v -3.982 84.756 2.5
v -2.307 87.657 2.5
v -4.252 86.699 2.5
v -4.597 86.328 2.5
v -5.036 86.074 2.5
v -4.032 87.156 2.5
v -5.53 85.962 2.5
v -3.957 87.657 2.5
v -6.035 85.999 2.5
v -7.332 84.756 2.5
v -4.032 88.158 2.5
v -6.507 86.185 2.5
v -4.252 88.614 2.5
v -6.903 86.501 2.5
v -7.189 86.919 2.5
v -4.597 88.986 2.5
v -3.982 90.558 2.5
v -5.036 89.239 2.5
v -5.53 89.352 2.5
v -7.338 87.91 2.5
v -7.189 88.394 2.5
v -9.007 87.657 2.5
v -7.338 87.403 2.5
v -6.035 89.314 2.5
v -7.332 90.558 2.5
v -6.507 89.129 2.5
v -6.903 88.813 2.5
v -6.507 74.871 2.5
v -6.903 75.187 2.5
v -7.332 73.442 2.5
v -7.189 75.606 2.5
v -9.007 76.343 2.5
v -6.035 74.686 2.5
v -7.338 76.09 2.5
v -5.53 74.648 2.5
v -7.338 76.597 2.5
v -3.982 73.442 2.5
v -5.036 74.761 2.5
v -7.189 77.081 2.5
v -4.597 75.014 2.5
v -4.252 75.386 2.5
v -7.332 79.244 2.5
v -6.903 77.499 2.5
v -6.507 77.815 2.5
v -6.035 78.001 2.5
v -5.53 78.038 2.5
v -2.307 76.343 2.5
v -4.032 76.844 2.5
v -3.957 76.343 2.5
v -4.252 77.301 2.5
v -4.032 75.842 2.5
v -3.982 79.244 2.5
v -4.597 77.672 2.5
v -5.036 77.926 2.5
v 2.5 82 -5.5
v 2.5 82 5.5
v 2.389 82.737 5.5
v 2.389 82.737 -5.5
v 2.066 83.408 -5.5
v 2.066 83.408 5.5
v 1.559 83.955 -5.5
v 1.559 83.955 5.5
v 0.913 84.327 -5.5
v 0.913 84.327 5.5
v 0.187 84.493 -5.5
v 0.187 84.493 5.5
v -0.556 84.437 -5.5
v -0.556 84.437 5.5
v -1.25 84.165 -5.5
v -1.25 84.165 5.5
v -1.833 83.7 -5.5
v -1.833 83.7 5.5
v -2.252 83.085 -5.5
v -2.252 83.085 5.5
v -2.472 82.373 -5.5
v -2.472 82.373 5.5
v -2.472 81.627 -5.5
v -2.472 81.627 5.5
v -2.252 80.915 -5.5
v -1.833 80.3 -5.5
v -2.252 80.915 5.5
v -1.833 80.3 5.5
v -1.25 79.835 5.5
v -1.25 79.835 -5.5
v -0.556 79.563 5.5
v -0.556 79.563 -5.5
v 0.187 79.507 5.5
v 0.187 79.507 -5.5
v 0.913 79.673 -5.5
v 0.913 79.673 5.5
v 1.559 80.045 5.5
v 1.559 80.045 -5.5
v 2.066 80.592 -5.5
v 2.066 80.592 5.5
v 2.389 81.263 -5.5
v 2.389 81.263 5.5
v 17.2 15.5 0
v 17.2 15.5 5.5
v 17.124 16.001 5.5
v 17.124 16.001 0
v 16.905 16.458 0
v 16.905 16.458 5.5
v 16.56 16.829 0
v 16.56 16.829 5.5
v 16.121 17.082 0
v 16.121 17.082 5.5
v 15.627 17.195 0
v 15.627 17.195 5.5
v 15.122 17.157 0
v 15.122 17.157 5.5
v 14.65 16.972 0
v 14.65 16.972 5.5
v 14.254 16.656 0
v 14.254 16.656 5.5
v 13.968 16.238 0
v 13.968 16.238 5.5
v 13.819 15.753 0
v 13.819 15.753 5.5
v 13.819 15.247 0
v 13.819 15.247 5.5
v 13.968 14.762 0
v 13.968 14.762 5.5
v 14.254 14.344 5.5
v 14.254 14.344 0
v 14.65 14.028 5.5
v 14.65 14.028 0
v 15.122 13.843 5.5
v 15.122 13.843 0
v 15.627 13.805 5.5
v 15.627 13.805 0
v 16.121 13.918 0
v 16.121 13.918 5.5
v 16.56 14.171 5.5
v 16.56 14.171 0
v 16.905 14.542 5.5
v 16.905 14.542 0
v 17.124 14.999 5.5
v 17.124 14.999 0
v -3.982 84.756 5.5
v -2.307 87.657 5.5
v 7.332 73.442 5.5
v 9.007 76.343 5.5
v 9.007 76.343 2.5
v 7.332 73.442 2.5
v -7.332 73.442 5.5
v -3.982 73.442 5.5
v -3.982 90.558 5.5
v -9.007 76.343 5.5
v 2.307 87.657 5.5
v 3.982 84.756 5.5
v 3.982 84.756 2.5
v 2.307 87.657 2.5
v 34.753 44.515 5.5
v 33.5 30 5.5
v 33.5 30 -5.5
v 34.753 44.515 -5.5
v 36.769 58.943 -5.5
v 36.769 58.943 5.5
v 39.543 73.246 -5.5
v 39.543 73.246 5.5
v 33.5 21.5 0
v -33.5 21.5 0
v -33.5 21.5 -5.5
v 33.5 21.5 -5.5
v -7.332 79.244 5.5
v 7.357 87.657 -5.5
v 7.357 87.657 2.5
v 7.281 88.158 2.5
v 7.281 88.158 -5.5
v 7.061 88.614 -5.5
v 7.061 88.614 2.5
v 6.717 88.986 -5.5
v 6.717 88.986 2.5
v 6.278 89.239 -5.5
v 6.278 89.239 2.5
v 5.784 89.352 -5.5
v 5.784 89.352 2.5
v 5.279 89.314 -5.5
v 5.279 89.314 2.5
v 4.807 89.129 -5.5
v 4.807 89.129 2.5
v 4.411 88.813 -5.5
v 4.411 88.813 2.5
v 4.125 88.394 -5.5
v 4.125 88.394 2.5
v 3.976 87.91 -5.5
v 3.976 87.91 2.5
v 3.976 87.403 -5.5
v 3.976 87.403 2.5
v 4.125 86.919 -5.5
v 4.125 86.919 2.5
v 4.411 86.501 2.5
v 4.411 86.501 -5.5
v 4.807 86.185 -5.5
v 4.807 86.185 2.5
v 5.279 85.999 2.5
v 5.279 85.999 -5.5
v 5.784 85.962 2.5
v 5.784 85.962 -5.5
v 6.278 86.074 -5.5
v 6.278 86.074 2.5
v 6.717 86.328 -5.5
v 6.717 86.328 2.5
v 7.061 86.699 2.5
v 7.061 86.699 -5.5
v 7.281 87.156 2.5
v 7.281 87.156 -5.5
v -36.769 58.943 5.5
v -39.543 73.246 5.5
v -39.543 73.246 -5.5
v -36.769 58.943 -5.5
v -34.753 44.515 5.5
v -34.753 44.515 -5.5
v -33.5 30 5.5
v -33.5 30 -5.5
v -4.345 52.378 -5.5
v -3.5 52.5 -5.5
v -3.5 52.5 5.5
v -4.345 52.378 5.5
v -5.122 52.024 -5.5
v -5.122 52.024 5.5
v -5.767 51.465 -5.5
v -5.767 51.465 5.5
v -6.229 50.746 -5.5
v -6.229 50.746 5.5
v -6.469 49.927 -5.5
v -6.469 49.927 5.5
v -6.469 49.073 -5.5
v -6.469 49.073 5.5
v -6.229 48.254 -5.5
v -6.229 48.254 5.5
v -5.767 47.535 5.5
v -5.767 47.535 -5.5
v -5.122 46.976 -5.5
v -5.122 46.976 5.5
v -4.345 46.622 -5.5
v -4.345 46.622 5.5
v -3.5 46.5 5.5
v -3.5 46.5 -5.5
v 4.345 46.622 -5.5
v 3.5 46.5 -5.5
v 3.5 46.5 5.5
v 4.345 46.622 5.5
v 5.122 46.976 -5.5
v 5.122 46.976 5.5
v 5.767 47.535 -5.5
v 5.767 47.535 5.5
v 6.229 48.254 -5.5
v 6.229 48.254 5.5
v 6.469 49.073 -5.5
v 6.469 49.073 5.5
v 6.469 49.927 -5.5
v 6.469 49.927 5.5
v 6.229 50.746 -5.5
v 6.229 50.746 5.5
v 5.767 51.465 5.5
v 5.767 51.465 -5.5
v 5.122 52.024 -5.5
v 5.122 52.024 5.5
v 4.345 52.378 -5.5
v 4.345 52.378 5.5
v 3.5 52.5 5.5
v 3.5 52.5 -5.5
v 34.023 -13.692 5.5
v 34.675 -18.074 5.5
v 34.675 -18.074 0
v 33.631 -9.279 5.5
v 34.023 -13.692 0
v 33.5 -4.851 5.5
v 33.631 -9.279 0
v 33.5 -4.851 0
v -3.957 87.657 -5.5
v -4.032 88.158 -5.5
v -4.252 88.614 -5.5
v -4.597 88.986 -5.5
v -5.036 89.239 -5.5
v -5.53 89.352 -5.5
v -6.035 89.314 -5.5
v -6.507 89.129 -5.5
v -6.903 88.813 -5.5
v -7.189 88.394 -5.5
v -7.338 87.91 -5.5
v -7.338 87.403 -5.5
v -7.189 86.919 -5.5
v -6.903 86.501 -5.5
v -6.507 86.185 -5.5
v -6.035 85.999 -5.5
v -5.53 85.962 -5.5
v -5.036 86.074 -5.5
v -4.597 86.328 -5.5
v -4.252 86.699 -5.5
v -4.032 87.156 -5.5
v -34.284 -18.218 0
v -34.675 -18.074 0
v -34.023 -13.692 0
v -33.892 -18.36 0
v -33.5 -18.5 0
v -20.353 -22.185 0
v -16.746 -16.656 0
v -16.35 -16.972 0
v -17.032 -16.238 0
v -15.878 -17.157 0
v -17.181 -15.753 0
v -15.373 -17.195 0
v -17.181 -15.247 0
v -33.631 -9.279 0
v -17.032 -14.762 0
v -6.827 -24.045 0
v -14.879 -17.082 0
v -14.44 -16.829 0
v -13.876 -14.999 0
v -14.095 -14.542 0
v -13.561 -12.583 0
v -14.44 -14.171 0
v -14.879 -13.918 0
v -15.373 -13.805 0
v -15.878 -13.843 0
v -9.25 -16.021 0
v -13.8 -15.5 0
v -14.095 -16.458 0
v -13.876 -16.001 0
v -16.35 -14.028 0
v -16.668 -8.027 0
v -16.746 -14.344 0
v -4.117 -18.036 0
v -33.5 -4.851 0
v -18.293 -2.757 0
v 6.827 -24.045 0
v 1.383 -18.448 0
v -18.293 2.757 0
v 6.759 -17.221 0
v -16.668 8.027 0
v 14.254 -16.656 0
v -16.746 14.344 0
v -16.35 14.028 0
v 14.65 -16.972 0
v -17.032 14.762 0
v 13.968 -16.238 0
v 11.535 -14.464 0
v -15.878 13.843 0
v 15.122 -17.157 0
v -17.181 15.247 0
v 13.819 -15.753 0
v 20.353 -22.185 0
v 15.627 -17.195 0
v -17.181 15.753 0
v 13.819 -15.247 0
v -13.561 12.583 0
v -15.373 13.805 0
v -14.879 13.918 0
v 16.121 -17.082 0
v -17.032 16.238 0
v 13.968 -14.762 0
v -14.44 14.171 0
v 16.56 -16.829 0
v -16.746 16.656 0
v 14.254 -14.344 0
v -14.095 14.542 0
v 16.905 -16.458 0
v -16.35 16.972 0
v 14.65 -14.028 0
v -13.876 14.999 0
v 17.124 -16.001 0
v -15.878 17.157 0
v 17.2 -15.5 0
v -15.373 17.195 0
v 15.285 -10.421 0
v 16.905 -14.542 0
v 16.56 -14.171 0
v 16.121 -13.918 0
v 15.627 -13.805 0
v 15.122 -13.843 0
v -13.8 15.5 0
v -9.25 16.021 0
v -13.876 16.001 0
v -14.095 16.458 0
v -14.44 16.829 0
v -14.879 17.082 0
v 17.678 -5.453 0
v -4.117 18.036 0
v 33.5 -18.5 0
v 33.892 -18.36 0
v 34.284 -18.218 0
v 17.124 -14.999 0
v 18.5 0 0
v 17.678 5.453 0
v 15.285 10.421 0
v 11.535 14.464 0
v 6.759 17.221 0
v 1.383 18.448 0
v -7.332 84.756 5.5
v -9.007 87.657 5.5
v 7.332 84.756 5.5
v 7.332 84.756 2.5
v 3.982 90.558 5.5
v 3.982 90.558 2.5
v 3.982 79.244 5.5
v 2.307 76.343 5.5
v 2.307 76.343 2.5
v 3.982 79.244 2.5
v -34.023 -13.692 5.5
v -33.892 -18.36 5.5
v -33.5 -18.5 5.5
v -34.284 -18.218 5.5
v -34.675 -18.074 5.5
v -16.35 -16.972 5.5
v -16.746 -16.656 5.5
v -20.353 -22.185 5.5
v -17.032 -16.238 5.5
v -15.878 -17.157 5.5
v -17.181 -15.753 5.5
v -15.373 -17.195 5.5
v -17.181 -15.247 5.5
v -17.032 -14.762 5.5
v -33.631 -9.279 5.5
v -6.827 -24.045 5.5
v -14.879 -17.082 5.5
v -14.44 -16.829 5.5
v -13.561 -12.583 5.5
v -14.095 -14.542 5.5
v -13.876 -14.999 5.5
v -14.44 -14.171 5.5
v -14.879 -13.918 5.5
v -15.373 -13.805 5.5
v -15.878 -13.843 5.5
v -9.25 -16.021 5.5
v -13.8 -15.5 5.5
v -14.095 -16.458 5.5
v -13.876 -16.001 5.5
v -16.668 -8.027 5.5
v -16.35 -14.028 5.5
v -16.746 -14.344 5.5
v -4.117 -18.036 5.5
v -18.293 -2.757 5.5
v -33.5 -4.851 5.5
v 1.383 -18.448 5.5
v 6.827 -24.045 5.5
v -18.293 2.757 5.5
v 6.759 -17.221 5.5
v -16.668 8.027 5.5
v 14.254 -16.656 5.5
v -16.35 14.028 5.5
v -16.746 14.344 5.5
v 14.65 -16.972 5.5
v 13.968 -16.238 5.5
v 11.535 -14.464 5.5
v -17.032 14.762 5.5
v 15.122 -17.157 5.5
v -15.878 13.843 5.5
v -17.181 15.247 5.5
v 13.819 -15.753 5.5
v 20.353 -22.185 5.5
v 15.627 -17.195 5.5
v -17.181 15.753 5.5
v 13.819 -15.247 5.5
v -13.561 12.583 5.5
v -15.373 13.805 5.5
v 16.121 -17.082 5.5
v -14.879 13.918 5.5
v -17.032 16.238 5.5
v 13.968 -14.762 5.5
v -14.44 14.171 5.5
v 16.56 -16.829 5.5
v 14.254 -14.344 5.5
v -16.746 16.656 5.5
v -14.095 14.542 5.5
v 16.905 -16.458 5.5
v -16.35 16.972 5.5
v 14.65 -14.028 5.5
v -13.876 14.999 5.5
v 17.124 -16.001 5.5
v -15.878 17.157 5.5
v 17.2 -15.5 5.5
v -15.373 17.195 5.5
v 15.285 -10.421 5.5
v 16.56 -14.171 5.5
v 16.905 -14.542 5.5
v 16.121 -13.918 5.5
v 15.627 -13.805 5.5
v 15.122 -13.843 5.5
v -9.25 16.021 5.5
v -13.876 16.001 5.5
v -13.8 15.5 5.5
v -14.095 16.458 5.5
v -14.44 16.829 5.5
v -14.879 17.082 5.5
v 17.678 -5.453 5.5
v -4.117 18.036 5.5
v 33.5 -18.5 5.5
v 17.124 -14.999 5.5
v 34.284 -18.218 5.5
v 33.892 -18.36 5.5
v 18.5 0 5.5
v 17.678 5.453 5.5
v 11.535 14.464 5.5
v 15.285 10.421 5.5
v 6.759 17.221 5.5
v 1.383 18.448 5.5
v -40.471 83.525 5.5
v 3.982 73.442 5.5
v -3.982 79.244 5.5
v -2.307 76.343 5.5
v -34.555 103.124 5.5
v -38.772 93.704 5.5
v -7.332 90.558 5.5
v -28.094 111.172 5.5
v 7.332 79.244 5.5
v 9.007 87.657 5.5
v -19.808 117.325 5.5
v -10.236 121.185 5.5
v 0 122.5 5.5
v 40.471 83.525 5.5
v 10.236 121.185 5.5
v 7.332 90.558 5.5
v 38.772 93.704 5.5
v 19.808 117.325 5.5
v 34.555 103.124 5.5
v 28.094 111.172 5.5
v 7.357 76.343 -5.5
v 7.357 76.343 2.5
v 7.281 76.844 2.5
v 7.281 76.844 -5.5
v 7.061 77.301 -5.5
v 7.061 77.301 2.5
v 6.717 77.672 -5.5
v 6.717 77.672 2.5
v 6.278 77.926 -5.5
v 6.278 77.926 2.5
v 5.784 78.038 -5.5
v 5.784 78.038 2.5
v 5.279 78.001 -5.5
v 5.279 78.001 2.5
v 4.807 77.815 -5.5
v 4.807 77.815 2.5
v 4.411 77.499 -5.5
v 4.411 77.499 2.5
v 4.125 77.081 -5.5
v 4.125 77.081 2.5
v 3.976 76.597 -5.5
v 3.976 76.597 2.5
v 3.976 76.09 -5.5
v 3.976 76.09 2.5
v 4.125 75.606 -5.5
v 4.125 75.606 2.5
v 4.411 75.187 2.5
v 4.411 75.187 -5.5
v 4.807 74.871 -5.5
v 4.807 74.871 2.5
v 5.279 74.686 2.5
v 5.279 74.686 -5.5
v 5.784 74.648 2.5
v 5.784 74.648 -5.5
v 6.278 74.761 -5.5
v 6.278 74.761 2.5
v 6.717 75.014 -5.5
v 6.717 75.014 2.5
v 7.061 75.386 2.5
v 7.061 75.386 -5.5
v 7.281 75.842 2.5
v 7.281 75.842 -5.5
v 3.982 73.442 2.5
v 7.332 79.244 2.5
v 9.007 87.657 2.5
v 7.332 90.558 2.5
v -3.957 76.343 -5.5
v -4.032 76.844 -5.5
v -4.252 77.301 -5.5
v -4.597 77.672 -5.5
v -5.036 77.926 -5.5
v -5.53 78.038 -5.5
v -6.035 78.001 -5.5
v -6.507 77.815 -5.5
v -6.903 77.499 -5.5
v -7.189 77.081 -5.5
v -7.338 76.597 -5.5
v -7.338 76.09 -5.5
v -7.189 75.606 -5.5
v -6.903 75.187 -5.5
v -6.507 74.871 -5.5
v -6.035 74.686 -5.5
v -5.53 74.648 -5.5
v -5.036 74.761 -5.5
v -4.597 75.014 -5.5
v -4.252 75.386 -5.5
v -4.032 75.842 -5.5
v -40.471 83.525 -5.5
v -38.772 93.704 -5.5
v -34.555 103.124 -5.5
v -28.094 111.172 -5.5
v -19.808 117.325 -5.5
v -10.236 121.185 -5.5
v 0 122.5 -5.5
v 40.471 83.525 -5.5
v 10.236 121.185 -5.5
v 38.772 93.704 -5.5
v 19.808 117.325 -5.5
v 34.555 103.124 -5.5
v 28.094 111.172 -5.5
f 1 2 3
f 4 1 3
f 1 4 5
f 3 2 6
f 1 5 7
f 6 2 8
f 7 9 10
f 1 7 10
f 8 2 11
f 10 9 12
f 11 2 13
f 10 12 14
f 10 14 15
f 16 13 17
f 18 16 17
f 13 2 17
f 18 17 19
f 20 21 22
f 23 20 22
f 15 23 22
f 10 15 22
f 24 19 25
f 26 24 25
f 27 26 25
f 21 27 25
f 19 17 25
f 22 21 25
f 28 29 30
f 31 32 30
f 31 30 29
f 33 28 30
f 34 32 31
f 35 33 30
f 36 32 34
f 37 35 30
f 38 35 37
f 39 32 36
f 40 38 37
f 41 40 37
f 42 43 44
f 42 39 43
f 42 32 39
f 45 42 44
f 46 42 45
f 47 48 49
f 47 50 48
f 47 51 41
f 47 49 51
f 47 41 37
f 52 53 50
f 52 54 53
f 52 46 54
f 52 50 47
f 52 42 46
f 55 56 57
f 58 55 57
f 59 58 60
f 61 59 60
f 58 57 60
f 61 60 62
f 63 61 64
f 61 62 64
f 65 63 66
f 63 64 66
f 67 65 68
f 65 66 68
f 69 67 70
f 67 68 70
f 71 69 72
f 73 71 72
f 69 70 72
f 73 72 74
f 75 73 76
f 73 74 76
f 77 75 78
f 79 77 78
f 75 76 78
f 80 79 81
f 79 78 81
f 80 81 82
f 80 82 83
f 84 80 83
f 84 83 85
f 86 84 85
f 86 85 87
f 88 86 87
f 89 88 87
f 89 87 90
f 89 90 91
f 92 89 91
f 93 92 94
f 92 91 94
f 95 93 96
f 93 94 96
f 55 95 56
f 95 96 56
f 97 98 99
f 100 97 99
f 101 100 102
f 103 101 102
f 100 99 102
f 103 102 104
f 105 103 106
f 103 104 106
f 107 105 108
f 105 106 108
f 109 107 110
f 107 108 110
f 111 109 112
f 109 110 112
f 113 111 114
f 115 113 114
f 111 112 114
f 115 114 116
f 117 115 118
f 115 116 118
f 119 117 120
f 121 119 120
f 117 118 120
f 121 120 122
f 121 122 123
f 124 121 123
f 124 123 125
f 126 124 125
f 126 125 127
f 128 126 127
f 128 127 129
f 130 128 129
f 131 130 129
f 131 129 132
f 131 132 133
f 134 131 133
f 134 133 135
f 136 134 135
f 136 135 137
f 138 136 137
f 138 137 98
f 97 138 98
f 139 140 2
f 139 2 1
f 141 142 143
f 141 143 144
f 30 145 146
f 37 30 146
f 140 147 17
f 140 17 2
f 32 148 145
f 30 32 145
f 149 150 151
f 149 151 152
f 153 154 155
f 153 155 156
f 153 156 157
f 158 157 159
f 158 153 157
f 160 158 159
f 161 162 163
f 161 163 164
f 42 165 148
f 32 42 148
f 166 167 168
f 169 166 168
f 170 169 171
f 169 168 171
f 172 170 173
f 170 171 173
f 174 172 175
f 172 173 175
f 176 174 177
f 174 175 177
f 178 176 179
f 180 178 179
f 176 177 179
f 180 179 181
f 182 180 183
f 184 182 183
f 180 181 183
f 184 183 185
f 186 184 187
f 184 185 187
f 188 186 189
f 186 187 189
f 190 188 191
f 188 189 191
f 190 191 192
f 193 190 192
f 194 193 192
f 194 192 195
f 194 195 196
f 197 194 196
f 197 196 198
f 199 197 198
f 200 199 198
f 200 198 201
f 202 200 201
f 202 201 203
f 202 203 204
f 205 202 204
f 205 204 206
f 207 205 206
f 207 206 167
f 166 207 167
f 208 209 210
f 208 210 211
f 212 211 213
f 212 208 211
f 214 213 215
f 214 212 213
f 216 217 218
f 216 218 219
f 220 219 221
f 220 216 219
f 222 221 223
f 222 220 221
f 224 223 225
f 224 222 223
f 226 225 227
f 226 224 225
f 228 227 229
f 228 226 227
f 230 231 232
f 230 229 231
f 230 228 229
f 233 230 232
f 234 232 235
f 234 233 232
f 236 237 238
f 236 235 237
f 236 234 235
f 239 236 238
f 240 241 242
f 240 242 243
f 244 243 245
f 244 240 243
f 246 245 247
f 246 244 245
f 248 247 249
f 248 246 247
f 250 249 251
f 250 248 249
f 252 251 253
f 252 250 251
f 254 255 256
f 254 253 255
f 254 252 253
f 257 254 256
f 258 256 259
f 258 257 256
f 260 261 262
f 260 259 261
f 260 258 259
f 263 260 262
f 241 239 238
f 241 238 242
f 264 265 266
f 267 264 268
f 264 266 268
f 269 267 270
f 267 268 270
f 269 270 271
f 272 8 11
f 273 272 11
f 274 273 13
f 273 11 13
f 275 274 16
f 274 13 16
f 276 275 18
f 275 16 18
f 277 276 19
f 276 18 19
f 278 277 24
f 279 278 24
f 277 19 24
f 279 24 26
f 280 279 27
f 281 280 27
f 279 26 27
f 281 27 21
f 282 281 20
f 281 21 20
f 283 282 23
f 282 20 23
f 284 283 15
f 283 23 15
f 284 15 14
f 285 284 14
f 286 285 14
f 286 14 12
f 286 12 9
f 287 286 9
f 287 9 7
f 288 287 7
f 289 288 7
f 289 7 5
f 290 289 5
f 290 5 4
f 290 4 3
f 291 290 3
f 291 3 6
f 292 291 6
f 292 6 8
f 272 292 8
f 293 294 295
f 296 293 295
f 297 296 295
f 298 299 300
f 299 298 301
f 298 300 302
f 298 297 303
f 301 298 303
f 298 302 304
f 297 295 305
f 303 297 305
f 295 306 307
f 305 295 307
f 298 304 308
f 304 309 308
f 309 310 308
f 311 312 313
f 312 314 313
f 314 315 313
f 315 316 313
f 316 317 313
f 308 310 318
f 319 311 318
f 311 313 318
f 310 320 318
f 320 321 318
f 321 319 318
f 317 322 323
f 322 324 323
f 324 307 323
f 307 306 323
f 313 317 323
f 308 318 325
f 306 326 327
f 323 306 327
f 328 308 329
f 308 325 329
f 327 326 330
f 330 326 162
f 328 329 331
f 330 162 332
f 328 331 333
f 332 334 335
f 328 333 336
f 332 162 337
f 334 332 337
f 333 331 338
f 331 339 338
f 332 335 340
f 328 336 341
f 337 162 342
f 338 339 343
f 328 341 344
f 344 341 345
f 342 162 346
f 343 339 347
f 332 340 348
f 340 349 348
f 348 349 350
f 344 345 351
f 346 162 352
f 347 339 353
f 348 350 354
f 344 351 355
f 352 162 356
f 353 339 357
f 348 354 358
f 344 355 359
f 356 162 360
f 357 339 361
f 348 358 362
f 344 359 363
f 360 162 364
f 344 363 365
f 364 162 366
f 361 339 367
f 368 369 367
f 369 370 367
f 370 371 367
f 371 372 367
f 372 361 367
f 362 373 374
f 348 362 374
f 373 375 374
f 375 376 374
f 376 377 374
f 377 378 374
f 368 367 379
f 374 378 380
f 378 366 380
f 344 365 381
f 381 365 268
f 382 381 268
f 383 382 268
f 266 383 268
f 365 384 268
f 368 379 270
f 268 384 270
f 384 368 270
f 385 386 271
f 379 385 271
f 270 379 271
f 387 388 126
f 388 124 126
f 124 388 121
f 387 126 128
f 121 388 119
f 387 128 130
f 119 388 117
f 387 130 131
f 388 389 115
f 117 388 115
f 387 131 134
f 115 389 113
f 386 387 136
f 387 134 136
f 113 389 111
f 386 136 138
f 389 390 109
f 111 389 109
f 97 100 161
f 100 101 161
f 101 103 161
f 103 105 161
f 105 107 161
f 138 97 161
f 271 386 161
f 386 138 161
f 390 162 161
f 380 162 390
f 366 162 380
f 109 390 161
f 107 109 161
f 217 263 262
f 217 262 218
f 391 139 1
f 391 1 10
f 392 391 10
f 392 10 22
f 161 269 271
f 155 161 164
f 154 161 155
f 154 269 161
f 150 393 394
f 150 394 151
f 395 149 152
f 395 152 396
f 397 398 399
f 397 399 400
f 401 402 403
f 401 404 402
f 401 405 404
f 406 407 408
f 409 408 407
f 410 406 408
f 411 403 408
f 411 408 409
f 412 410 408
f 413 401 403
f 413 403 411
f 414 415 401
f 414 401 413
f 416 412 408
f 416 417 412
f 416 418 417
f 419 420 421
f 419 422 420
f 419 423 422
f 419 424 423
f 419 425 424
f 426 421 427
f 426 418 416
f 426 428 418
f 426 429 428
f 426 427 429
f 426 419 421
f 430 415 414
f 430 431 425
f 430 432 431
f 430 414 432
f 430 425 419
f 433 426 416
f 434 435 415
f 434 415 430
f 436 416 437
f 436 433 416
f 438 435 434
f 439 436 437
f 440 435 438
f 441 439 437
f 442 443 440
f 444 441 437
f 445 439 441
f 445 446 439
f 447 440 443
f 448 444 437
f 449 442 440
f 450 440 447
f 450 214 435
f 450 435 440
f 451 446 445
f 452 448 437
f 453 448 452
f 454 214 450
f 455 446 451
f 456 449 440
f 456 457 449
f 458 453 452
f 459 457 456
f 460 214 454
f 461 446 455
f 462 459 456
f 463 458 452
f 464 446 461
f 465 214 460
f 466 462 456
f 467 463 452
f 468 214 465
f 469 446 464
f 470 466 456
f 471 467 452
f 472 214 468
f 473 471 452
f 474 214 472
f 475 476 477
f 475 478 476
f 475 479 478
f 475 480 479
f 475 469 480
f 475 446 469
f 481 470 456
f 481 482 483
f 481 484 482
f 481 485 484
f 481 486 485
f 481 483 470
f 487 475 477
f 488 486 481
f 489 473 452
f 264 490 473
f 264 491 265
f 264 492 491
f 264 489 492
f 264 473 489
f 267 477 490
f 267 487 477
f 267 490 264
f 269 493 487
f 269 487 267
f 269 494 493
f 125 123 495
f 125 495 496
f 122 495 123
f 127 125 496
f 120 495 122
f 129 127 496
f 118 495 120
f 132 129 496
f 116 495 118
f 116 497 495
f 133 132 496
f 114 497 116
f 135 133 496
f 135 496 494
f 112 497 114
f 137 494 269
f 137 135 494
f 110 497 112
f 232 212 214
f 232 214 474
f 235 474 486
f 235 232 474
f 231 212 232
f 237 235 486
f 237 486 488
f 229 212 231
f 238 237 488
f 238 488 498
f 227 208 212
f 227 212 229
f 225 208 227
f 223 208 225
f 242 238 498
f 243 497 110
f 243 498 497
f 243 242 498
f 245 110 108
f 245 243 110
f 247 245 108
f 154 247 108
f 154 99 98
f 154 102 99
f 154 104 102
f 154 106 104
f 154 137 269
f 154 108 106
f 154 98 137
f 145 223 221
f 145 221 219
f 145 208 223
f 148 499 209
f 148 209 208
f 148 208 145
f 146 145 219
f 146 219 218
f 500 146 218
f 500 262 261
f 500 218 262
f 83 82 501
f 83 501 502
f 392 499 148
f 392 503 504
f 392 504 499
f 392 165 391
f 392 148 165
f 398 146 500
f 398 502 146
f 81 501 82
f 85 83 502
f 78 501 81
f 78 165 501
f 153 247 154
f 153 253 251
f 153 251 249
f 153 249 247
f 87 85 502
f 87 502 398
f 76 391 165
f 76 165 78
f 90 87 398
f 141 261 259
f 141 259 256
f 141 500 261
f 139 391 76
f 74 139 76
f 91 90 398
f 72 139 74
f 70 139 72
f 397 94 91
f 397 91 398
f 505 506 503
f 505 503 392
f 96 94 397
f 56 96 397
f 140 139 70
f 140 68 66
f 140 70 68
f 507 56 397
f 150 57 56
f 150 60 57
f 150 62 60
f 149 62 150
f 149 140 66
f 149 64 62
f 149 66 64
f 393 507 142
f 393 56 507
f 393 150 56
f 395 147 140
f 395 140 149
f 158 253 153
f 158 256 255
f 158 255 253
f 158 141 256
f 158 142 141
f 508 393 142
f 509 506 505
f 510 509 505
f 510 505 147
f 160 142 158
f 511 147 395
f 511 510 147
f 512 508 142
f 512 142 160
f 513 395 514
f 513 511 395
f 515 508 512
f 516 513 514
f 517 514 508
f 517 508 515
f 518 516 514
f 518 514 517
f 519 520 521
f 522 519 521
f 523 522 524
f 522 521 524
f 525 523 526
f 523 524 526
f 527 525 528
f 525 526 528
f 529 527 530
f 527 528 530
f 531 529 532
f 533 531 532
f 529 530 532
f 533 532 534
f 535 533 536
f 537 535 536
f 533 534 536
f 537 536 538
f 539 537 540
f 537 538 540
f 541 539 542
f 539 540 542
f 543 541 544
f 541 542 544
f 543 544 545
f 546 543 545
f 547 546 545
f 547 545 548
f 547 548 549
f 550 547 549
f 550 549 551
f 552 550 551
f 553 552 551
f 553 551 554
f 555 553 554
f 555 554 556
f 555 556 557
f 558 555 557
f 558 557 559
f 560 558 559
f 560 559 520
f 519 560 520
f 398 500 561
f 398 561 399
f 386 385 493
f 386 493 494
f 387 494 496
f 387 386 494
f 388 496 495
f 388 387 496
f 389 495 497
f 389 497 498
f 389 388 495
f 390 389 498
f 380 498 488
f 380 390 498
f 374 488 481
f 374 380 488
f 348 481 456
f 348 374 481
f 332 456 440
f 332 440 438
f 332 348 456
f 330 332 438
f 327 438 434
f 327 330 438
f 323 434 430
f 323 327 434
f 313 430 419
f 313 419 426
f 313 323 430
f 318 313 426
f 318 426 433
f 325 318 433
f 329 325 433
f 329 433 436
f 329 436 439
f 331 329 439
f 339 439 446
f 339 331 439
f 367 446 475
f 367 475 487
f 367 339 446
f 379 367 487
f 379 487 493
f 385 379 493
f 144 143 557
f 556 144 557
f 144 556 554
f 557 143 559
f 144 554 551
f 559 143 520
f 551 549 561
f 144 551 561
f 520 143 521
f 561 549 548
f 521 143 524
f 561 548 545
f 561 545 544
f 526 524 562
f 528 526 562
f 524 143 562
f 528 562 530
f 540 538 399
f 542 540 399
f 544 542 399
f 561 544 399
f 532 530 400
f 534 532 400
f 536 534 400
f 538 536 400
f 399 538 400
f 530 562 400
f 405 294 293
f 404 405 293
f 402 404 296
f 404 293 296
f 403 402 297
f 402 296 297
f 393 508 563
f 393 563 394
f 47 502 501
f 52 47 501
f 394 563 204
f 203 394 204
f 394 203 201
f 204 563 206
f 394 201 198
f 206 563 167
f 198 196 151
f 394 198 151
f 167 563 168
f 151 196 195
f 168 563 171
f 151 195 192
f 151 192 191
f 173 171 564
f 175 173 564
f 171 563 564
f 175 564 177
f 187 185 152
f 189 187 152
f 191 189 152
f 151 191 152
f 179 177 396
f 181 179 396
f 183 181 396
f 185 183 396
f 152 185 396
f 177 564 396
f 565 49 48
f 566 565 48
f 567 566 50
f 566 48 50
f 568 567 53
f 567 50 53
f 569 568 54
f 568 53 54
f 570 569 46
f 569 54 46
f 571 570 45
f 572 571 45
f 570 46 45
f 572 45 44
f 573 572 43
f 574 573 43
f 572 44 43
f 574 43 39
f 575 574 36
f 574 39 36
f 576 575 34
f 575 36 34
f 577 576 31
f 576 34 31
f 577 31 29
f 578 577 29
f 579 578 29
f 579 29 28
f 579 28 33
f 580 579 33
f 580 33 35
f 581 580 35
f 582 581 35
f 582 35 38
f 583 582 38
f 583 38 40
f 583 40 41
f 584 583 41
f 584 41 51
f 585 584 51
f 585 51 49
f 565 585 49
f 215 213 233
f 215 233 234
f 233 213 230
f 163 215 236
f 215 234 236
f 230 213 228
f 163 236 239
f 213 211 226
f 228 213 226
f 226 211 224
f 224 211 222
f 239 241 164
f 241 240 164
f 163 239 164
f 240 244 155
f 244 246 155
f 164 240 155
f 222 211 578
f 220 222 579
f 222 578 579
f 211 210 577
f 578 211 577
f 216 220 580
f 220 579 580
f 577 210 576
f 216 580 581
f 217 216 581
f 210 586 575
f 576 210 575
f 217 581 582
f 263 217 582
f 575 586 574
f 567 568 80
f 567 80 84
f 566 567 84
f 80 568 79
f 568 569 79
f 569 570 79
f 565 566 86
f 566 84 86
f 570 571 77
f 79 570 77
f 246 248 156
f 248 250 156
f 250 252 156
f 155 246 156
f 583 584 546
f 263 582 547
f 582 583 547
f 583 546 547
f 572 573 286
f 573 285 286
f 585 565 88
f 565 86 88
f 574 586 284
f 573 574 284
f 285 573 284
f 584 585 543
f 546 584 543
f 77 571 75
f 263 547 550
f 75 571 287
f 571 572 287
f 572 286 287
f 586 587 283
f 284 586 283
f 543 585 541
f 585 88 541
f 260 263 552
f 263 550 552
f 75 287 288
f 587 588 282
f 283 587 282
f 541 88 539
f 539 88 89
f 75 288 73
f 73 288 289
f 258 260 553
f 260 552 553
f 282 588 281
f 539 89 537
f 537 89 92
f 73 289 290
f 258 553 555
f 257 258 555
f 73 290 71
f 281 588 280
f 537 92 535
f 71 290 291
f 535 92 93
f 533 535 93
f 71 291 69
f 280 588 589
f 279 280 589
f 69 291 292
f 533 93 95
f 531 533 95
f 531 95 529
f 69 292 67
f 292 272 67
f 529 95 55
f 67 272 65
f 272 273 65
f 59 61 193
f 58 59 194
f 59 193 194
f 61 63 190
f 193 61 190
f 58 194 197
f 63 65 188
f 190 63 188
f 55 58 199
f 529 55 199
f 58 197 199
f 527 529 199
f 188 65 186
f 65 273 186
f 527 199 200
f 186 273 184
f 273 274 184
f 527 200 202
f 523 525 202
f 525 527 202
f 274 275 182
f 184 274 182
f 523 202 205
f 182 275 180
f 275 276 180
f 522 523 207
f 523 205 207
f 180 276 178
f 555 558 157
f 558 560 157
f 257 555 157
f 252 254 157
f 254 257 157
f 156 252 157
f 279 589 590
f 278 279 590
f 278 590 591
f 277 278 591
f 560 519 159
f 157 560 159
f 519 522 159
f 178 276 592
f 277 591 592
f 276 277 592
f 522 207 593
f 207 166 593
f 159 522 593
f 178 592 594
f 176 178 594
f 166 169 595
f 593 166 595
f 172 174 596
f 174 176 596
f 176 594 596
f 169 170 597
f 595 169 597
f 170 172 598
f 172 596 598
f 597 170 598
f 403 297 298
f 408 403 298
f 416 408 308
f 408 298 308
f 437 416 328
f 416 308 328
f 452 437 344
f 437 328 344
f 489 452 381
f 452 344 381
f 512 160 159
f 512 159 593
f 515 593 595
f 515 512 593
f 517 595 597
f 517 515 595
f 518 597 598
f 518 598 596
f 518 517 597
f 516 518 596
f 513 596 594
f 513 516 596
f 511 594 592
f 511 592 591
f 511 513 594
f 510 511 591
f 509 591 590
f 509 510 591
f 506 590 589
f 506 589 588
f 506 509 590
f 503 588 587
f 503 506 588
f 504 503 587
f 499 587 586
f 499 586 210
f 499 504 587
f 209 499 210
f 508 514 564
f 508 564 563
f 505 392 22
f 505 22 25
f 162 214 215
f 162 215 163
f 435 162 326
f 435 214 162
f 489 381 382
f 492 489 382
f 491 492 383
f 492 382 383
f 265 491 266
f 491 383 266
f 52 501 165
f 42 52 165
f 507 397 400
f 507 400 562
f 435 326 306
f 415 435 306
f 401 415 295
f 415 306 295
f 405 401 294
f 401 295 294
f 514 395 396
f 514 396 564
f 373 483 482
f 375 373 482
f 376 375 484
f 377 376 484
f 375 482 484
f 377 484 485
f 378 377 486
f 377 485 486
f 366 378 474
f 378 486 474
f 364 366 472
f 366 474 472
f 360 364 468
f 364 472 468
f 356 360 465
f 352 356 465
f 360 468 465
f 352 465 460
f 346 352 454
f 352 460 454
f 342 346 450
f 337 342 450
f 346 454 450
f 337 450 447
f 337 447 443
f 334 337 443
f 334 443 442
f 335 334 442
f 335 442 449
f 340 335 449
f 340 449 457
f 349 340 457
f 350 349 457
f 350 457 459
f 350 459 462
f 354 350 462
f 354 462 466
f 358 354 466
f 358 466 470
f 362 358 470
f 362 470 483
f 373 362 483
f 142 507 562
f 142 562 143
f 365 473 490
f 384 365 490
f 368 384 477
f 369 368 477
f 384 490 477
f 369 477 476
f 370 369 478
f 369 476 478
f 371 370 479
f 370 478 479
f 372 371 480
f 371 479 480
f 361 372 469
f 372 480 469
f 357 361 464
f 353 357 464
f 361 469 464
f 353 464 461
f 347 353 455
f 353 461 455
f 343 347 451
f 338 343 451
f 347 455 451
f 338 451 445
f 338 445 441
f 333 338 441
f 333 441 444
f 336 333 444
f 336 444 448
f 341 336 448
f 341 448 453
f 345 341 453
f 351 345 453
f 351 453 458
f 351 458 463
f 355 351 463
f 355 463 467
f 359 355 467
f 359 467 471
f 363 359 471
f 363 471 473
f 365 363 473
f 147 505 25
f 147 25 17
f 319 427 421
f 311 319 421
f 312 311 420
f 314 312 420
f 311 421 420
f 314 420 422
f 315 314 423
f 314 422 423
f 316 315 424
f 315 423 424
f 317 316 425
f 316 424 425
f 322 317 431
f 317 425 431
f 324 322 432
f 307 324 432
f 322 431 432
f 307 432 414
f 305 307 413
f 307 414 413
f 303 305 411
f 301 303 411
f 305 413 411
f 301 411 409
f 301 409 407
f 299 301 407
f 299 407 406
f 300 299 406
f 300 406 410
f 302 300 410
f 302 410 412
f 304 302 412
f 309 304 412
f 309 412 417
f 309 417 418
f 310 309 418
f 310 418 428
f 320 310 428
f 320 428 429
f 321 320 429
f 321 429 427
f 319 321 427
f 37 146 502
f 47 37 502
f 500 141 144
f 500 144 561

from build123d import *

# Parameters (mm, degrees)
SKETCH1_W           = 43
SKETCH1_H           = 43
SKETCH1_R           = 18.5
BOSS_EXTRUDE1_DEPTH = 5.5
SKETCH2_R           = 1.7
SKETCH2_R_2         = 2.5
BOSS_EXTRUDE2_DEPTH = 11
SKETCH3_R           = 1.7
CUT_EXTRUDE1_DEPTH  = 134.376282332
CUT_EXTRUDE11_DEPTH = 10
CUT_EXTRUDE12_DEPTH = 3
CUT_EXTRUDE13_DEPTH = 130.489381804


with BuildPart() as part:
    # Sketch1 → Boss-Extrude1 (new body)
    # profile 1 of 10: a face of its own
    with BuildSketch(Plane.XY):
        with BuildLine():
            Line((-33.5, -30), (-33.5, -4.850925931))
            ThreePointArc((-33.5, -4.850925931), (-34.593523061, -17.611516296), (-37.84220444, -30))
            Line((-37.84220444, -30), (-33.5, -30))
        make_face()
    # profile 2 of 10: a face of its own
    with BuildSketch(Plane.XY):
        Polygon((-21.5, -21.5), (-21.5, 21.5), (-33.5, 21.5), (-33.5, -4.850925931), (-33.5, -30), (0, -30), (33.5, -30), (33.5, -4.850925931), (33.5, 21.5), (21.5, 21.5), (21.5, -21.5), align=None)
    # profile 3 of 10: a face of its own
    with BuildSketch(Plane.XY):
        with BuildLine():
            ThreePointArc((37.84220444, -30), (34.593523061, -17.611516296), (33.5, -4.850925931))
            Line((33.5, -4.850925931), (33.5, -30))
            Line((33.5, -30), (37.84220444, -30))
        make_face()
    # profile 4 of 10: a face of its own
    with BuildSketch(Plane.XY):
        Rectangle(SKETCH1_W, SKETCH1_H)
        Circle(SKETCH1_R, mode=Mode.SUBTRACT)
    # profile 5 of 10: a face of its own
    with BuildSketch(Plane.XY):
        with BuildLine():
            Line((38.394173914, -31.5), (33.5, -31.5))
            Line((33.5, -31.5), (14.203872711, -31.5))
            ThreePointArc((14.203872711, -31.5), (34.722076366, -39.533108404), (51.594405594, -53.705335408))
            ThreePointArc((51.594405594, -53.705335408), (44.031058144, -43.175272448), (38.394173914, -31.5))
        make_face()
    # profile 6 of 10: a face of its own
    with BuildSketch(Plane.XY):
        with BuildLine():
            Line((-14.203872711, -31.5), (-33.5, -31.5))
            Line((-33.5, -31.5), (-38.394173914, -31.5))
            ThreePointArc((-38.394173914, -31.5), (-44.031058144, -43.175272448), (-51.594405594, -53.705335408))
            ThreePointArc((-51.594405594, -53.705335408), (-34.722076366, -39.533108404), (-14.203872711, -31.5))
        make_face()
    # profile 7 of 10: a face of its own
    with BuildSketch(Plane.XY):
        with BuildLine():
            Line((0, -30), (-33.5, -30))
            Line((-33.5, -30), (-33.5, -31.5))
            Line((-33.5, -31.5), (-14.203872711, -31.5))
            ThreePointArc((-14.203872711, -31.5), (-7.141428429, -30.376039749), (0, -30))
        make_face()
    # profile 8 of 10: a face of its own
    with BuildSketch(Plane.XY):
        with BuildLine():
            Line((33.5, -31.5), (33.5, -30))
            Line((33.5, -30), (0, -30))
            ThreePointArc((0, -30), (7.141428429, -30.376039749), (14.203872711, -31.5))
            Line((14.203872711, -31.5), (33.5, -31.5))
        make_face()
    # profile 9 of 10: a face of its own
    with BuildSketch(Plane.XY):
        with BuildLine():
            Line((37.84220444, -30), (33.5, -30))
            Line((33.5, -30), (33.5, -31.5))
            Line((33.5, -31.5), (38.394173914, -31.5))
            ThreePointArc((38.394173914, -31.5), (38.114193229, -30.751470427), (37.84220444, -30))
        make_face()
    # profile 10 of 10: a face of its own
    with BuildSketch(Plane.XY):
        with BuildLine():
            Line((-33.5, -31.5), (-33.5, -30))
            Line((-33.5, -30), (-37.84220444, -30))
            ThreePointArc((-37.84220444, -30), (-38.114193229, -30.751470427), (-38.394173914, -31.5))
            Line((-38.394173914, -31.5), (-33.5, -31.5))
        make_face()
    extrude(amount=BOSS_EXTRUDE1_DEPTH)

    # Sketch2 → Boss-Extrude2 (add)
    with BuildSketch(Plane.XY.offset(5.5)):
        with BuildLine():
            Line((-33.5, 30), (-33.5, 21.5))
            Line((-33.5, 21.5), (33.5, 21.5))
            Line((33.5, 21.5), (33.5, 30))
            ThreePointArc((33.5, 30), (35.66625593, 51.742394188), (39.542569928, 73.245848783))
            ThreePointArc((39.542569928, 73.245848783), (0, 122.5), (-39.542569928, 73.245848783))
            ThreePointArc((-39.542569928, 73.245848783), (-35.66625593, 51.742394188), (-33.5, 30))
        make_face()
        with Locations((-5.656854249, 76.343145751)):
            Circle(SKETCH2_R, mode=Mode.SUBTRACT)
        with Locations((5.656854249, 76.343145751)):
            Circle(SKETCH2_R, mode=Mode.SUBTRACT)
        with Locations((0, 82)):
            Circle(SKETCH2_R_2, mode=Mode.SUBTRACT)
        with Locations((-5.656854249, 87.656854249)):
            Circle(SKETCH2_R, mode=Mode.SUBTRACT)
        with Locations((5.656854249, 87.656854249)):
            Circle(SKETCH2_R, mode=Mode.SUBTRACT)
    extrude(amount=-BOSS_EXTRUDE2_DEPTH)

    # Sketch3 → Cut-Extrude1 (cut, through all)
    with BuildSketch(Plane.XY.offset(5.5)):
        with Locations((-15.5, 15.5)):
            Circle(SKETCH3_R)
        with Locations((15.5, 15.5)):
            Circle(SKETCH3_R)
        with Locations((15.5, -15.5)):
            Circle(SKETCH3_R)
        with Locations((-15.5, -15.5)):
            Circle(SKETCH3_R)
    extrude(amount=-CUT_EXTRUDE1_DEPTH, mode=Mode.SUBTRACT)

    # Sketch4 → Cut-Extrude11 (cut)
    with BuildSketch(Plane(origin=(0, 0, 0), x_dir=(-1, 0, 0), z_dir=(0, 0, -1))):
        with BuildLine():
            ThreePointArc((33.5, -18.5), (0, -24.278187239), (-33.5, -18.5))
            ThreePointArc((-33.5, -18.5), (-34.088098429, -18.288833154), (-34.674865885, -18.073995652))
            ThreePointArc((-34.674865885, -18.073995652), (-40.75024769, -37.021892063), (-51.594405594, -53.705335408))
            ThreePointArc((-51.594405594, -53.705335408), (0, -30), (51.594405594, -53.705335408))
            ThreePointArc((51.594405594, -53.705335408), (40.75024769, -37.021892063), (34.674865885, -18.073995652))
            ThreePointArc((34.674865885, -18.073995652), (34.088098429, -18.288833154), (33.5, -18.5))
        make_face()
    extrude(amount=-CUT_EXTRUDE11_DEPTH, mode=Mode.SUBTRACT)

    # Sketch5 → Cut-Extrude12 (cut)
    with BuildSketch(Plane.XY.offset(5.5)):
        Polygon((-7.331854249, 90.558039352), (-3.981854249, 90.558039352), (-2.306854249, 87.656854249), (-3.981854249, 84.755669147), (-7.331854249, 84.755669147), (-9.006854249, 87.656854249), align=None)
        Polygon((3.981854249, 90.558039352), (7.331854249, 90.558039352), (9.006854249, 87.656854249), (7.331854249, 84.755669147), (3.981854249, 84.755669147), (2.306854249, 87.656854249), align=None)
        Polygon((-7.331854249, 79.244330853), (-9.006854249, 76.343145751), (-7.331854249, 73.441960648), (-3.981854249, 73.441960648), (-2.306854249, 76.343145751), (-3.981854249, 79.244330853), align=None)
        Polygon((3.981854249, 79.244330853), (7.331854249, 79.244330853), (9.006854249, 76.343145751), (7.331854249, 73.441960648), (3.981854249, 73.441960648), (2.306854249, 76.343145751), align=None)
    extrude(amount=-CUT_EXTRUDE12_DEPTH, mode=Mode.SUBTRACT)

    # Sketch6 → Cut-Extrude13 (cut, through all)
    with BuildSketch(Plane(origin=(0, 0, -5.5), x_dir=(-1, 0, 0), z_dir=(0, 0, -1))):
        with BuildLine():
            Line((3.5, 46.5), (-3.5, 46.5))
            ThreePointArc((-3.5, 46.5), (-6.5, 49.5), (-3.5, 52.5))
            Line((-3.5, 52.5), (3.5, 52.5))
            ThreePointArc((3.5, 52.5), (6.5, 49.5), (3.5, 46.5))
        make_face()
    extrude(amount=-CUT_EXTRUDE13_DEPTH, mode=Mode.SUBTRACT)


solid = part.part
